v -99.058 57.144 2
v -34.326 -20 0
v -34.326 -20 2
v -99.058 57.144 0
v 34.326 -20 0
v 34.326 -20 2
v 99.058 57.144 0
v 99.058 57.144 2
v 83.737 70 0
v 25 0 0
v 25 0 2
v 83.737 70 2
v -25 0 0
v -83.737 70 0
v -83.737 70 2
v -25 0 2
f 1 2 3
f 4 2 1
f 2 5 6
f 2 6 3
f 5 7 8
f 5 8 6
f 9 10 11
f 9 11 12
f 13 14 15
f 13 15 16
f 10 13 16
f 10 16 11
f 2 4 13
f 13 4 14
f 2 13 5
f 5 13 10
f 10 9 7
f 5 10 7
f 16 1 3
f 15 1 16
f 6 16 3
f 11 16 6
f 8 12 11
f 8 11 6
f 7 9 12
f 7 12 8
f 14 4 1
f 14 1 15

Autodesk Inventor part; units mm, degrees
ref_plane "YZ Plane" through (0, 0, 0) normal (1, 0, 0) x (0, 1, 0)
ref_plane "XZ Plane" through (0, 0, 0) normal (0, 1, 0) x (-1, 0, 0)
ref_plane "XY Plane" through (0, 0, 0) normal (0, 0, 1) x (1, 0, 0)
sketch "Sketch1" plane through (0, 0, 0) normal (0, 0, 1) x (1, 0, 0)
  line L0 (-25, 0) -> (25, 0)
  line L1 (25, 0) -> (83.737, 70)
  line L2 (83.737, 70) -> (99.0579, 57.1442)
  line L3 (99.0579, 57.1442) -> (34.3262, -20)
  line L4 (34.3262, -20) -> (-34.3262, -20)
  line L5 (-34.3262, -20) -> (-99.0579, 57.1442)
  line L6 (-99.0579, 57.1442) -> (-83.737, 70)
  line L7 (-83.737, 70) -> (-25, 0)
  line L8 (0, 0) -> (0, -20) construction
  dimension "d0" = 50
  dimension "d1" = 70
  dimension "d2" = 130
  dimension "d3" = 20
extrude "Plate1" add sketch "Sketch1" along normal blind 2
equation "\"d0\" = Лоток_ширина_низ"
equation "\"d1\" = Лоток_высота - Лоток_глубина_выреза"
equation "\"d2\" = Лоток_угол"
equation "\"d4\" = Thickness"
equation "\"BendRadius\" = Thickness"
equation "\"BendReliefWidth\" = Thickness"
equation "\"BendReliefDepth\" = 0.5 * Thickness"
equation "\"CornerReliefSize\" = 4 * Thickness"
equation "\"MinimumRemnant\" = 2 * Thickness"
equation "\"TransitionRadius\" = BendRadius"
equation "\"JacobiRadiusSize\" = BendRadius"
equation "\"GapSize\" = Thickness"
equation "\"Лоток_ширина_низ\" = 50"
equation "\"Лоток_высота\" = 100"
equation "\"Лоток_глубина_выреза\" = 30"
equation "\"Лоток_угол\" = 130deg"
equation "\"Thickness\" = 2"
properties part number "ДМФ 044 фланец лотка"
